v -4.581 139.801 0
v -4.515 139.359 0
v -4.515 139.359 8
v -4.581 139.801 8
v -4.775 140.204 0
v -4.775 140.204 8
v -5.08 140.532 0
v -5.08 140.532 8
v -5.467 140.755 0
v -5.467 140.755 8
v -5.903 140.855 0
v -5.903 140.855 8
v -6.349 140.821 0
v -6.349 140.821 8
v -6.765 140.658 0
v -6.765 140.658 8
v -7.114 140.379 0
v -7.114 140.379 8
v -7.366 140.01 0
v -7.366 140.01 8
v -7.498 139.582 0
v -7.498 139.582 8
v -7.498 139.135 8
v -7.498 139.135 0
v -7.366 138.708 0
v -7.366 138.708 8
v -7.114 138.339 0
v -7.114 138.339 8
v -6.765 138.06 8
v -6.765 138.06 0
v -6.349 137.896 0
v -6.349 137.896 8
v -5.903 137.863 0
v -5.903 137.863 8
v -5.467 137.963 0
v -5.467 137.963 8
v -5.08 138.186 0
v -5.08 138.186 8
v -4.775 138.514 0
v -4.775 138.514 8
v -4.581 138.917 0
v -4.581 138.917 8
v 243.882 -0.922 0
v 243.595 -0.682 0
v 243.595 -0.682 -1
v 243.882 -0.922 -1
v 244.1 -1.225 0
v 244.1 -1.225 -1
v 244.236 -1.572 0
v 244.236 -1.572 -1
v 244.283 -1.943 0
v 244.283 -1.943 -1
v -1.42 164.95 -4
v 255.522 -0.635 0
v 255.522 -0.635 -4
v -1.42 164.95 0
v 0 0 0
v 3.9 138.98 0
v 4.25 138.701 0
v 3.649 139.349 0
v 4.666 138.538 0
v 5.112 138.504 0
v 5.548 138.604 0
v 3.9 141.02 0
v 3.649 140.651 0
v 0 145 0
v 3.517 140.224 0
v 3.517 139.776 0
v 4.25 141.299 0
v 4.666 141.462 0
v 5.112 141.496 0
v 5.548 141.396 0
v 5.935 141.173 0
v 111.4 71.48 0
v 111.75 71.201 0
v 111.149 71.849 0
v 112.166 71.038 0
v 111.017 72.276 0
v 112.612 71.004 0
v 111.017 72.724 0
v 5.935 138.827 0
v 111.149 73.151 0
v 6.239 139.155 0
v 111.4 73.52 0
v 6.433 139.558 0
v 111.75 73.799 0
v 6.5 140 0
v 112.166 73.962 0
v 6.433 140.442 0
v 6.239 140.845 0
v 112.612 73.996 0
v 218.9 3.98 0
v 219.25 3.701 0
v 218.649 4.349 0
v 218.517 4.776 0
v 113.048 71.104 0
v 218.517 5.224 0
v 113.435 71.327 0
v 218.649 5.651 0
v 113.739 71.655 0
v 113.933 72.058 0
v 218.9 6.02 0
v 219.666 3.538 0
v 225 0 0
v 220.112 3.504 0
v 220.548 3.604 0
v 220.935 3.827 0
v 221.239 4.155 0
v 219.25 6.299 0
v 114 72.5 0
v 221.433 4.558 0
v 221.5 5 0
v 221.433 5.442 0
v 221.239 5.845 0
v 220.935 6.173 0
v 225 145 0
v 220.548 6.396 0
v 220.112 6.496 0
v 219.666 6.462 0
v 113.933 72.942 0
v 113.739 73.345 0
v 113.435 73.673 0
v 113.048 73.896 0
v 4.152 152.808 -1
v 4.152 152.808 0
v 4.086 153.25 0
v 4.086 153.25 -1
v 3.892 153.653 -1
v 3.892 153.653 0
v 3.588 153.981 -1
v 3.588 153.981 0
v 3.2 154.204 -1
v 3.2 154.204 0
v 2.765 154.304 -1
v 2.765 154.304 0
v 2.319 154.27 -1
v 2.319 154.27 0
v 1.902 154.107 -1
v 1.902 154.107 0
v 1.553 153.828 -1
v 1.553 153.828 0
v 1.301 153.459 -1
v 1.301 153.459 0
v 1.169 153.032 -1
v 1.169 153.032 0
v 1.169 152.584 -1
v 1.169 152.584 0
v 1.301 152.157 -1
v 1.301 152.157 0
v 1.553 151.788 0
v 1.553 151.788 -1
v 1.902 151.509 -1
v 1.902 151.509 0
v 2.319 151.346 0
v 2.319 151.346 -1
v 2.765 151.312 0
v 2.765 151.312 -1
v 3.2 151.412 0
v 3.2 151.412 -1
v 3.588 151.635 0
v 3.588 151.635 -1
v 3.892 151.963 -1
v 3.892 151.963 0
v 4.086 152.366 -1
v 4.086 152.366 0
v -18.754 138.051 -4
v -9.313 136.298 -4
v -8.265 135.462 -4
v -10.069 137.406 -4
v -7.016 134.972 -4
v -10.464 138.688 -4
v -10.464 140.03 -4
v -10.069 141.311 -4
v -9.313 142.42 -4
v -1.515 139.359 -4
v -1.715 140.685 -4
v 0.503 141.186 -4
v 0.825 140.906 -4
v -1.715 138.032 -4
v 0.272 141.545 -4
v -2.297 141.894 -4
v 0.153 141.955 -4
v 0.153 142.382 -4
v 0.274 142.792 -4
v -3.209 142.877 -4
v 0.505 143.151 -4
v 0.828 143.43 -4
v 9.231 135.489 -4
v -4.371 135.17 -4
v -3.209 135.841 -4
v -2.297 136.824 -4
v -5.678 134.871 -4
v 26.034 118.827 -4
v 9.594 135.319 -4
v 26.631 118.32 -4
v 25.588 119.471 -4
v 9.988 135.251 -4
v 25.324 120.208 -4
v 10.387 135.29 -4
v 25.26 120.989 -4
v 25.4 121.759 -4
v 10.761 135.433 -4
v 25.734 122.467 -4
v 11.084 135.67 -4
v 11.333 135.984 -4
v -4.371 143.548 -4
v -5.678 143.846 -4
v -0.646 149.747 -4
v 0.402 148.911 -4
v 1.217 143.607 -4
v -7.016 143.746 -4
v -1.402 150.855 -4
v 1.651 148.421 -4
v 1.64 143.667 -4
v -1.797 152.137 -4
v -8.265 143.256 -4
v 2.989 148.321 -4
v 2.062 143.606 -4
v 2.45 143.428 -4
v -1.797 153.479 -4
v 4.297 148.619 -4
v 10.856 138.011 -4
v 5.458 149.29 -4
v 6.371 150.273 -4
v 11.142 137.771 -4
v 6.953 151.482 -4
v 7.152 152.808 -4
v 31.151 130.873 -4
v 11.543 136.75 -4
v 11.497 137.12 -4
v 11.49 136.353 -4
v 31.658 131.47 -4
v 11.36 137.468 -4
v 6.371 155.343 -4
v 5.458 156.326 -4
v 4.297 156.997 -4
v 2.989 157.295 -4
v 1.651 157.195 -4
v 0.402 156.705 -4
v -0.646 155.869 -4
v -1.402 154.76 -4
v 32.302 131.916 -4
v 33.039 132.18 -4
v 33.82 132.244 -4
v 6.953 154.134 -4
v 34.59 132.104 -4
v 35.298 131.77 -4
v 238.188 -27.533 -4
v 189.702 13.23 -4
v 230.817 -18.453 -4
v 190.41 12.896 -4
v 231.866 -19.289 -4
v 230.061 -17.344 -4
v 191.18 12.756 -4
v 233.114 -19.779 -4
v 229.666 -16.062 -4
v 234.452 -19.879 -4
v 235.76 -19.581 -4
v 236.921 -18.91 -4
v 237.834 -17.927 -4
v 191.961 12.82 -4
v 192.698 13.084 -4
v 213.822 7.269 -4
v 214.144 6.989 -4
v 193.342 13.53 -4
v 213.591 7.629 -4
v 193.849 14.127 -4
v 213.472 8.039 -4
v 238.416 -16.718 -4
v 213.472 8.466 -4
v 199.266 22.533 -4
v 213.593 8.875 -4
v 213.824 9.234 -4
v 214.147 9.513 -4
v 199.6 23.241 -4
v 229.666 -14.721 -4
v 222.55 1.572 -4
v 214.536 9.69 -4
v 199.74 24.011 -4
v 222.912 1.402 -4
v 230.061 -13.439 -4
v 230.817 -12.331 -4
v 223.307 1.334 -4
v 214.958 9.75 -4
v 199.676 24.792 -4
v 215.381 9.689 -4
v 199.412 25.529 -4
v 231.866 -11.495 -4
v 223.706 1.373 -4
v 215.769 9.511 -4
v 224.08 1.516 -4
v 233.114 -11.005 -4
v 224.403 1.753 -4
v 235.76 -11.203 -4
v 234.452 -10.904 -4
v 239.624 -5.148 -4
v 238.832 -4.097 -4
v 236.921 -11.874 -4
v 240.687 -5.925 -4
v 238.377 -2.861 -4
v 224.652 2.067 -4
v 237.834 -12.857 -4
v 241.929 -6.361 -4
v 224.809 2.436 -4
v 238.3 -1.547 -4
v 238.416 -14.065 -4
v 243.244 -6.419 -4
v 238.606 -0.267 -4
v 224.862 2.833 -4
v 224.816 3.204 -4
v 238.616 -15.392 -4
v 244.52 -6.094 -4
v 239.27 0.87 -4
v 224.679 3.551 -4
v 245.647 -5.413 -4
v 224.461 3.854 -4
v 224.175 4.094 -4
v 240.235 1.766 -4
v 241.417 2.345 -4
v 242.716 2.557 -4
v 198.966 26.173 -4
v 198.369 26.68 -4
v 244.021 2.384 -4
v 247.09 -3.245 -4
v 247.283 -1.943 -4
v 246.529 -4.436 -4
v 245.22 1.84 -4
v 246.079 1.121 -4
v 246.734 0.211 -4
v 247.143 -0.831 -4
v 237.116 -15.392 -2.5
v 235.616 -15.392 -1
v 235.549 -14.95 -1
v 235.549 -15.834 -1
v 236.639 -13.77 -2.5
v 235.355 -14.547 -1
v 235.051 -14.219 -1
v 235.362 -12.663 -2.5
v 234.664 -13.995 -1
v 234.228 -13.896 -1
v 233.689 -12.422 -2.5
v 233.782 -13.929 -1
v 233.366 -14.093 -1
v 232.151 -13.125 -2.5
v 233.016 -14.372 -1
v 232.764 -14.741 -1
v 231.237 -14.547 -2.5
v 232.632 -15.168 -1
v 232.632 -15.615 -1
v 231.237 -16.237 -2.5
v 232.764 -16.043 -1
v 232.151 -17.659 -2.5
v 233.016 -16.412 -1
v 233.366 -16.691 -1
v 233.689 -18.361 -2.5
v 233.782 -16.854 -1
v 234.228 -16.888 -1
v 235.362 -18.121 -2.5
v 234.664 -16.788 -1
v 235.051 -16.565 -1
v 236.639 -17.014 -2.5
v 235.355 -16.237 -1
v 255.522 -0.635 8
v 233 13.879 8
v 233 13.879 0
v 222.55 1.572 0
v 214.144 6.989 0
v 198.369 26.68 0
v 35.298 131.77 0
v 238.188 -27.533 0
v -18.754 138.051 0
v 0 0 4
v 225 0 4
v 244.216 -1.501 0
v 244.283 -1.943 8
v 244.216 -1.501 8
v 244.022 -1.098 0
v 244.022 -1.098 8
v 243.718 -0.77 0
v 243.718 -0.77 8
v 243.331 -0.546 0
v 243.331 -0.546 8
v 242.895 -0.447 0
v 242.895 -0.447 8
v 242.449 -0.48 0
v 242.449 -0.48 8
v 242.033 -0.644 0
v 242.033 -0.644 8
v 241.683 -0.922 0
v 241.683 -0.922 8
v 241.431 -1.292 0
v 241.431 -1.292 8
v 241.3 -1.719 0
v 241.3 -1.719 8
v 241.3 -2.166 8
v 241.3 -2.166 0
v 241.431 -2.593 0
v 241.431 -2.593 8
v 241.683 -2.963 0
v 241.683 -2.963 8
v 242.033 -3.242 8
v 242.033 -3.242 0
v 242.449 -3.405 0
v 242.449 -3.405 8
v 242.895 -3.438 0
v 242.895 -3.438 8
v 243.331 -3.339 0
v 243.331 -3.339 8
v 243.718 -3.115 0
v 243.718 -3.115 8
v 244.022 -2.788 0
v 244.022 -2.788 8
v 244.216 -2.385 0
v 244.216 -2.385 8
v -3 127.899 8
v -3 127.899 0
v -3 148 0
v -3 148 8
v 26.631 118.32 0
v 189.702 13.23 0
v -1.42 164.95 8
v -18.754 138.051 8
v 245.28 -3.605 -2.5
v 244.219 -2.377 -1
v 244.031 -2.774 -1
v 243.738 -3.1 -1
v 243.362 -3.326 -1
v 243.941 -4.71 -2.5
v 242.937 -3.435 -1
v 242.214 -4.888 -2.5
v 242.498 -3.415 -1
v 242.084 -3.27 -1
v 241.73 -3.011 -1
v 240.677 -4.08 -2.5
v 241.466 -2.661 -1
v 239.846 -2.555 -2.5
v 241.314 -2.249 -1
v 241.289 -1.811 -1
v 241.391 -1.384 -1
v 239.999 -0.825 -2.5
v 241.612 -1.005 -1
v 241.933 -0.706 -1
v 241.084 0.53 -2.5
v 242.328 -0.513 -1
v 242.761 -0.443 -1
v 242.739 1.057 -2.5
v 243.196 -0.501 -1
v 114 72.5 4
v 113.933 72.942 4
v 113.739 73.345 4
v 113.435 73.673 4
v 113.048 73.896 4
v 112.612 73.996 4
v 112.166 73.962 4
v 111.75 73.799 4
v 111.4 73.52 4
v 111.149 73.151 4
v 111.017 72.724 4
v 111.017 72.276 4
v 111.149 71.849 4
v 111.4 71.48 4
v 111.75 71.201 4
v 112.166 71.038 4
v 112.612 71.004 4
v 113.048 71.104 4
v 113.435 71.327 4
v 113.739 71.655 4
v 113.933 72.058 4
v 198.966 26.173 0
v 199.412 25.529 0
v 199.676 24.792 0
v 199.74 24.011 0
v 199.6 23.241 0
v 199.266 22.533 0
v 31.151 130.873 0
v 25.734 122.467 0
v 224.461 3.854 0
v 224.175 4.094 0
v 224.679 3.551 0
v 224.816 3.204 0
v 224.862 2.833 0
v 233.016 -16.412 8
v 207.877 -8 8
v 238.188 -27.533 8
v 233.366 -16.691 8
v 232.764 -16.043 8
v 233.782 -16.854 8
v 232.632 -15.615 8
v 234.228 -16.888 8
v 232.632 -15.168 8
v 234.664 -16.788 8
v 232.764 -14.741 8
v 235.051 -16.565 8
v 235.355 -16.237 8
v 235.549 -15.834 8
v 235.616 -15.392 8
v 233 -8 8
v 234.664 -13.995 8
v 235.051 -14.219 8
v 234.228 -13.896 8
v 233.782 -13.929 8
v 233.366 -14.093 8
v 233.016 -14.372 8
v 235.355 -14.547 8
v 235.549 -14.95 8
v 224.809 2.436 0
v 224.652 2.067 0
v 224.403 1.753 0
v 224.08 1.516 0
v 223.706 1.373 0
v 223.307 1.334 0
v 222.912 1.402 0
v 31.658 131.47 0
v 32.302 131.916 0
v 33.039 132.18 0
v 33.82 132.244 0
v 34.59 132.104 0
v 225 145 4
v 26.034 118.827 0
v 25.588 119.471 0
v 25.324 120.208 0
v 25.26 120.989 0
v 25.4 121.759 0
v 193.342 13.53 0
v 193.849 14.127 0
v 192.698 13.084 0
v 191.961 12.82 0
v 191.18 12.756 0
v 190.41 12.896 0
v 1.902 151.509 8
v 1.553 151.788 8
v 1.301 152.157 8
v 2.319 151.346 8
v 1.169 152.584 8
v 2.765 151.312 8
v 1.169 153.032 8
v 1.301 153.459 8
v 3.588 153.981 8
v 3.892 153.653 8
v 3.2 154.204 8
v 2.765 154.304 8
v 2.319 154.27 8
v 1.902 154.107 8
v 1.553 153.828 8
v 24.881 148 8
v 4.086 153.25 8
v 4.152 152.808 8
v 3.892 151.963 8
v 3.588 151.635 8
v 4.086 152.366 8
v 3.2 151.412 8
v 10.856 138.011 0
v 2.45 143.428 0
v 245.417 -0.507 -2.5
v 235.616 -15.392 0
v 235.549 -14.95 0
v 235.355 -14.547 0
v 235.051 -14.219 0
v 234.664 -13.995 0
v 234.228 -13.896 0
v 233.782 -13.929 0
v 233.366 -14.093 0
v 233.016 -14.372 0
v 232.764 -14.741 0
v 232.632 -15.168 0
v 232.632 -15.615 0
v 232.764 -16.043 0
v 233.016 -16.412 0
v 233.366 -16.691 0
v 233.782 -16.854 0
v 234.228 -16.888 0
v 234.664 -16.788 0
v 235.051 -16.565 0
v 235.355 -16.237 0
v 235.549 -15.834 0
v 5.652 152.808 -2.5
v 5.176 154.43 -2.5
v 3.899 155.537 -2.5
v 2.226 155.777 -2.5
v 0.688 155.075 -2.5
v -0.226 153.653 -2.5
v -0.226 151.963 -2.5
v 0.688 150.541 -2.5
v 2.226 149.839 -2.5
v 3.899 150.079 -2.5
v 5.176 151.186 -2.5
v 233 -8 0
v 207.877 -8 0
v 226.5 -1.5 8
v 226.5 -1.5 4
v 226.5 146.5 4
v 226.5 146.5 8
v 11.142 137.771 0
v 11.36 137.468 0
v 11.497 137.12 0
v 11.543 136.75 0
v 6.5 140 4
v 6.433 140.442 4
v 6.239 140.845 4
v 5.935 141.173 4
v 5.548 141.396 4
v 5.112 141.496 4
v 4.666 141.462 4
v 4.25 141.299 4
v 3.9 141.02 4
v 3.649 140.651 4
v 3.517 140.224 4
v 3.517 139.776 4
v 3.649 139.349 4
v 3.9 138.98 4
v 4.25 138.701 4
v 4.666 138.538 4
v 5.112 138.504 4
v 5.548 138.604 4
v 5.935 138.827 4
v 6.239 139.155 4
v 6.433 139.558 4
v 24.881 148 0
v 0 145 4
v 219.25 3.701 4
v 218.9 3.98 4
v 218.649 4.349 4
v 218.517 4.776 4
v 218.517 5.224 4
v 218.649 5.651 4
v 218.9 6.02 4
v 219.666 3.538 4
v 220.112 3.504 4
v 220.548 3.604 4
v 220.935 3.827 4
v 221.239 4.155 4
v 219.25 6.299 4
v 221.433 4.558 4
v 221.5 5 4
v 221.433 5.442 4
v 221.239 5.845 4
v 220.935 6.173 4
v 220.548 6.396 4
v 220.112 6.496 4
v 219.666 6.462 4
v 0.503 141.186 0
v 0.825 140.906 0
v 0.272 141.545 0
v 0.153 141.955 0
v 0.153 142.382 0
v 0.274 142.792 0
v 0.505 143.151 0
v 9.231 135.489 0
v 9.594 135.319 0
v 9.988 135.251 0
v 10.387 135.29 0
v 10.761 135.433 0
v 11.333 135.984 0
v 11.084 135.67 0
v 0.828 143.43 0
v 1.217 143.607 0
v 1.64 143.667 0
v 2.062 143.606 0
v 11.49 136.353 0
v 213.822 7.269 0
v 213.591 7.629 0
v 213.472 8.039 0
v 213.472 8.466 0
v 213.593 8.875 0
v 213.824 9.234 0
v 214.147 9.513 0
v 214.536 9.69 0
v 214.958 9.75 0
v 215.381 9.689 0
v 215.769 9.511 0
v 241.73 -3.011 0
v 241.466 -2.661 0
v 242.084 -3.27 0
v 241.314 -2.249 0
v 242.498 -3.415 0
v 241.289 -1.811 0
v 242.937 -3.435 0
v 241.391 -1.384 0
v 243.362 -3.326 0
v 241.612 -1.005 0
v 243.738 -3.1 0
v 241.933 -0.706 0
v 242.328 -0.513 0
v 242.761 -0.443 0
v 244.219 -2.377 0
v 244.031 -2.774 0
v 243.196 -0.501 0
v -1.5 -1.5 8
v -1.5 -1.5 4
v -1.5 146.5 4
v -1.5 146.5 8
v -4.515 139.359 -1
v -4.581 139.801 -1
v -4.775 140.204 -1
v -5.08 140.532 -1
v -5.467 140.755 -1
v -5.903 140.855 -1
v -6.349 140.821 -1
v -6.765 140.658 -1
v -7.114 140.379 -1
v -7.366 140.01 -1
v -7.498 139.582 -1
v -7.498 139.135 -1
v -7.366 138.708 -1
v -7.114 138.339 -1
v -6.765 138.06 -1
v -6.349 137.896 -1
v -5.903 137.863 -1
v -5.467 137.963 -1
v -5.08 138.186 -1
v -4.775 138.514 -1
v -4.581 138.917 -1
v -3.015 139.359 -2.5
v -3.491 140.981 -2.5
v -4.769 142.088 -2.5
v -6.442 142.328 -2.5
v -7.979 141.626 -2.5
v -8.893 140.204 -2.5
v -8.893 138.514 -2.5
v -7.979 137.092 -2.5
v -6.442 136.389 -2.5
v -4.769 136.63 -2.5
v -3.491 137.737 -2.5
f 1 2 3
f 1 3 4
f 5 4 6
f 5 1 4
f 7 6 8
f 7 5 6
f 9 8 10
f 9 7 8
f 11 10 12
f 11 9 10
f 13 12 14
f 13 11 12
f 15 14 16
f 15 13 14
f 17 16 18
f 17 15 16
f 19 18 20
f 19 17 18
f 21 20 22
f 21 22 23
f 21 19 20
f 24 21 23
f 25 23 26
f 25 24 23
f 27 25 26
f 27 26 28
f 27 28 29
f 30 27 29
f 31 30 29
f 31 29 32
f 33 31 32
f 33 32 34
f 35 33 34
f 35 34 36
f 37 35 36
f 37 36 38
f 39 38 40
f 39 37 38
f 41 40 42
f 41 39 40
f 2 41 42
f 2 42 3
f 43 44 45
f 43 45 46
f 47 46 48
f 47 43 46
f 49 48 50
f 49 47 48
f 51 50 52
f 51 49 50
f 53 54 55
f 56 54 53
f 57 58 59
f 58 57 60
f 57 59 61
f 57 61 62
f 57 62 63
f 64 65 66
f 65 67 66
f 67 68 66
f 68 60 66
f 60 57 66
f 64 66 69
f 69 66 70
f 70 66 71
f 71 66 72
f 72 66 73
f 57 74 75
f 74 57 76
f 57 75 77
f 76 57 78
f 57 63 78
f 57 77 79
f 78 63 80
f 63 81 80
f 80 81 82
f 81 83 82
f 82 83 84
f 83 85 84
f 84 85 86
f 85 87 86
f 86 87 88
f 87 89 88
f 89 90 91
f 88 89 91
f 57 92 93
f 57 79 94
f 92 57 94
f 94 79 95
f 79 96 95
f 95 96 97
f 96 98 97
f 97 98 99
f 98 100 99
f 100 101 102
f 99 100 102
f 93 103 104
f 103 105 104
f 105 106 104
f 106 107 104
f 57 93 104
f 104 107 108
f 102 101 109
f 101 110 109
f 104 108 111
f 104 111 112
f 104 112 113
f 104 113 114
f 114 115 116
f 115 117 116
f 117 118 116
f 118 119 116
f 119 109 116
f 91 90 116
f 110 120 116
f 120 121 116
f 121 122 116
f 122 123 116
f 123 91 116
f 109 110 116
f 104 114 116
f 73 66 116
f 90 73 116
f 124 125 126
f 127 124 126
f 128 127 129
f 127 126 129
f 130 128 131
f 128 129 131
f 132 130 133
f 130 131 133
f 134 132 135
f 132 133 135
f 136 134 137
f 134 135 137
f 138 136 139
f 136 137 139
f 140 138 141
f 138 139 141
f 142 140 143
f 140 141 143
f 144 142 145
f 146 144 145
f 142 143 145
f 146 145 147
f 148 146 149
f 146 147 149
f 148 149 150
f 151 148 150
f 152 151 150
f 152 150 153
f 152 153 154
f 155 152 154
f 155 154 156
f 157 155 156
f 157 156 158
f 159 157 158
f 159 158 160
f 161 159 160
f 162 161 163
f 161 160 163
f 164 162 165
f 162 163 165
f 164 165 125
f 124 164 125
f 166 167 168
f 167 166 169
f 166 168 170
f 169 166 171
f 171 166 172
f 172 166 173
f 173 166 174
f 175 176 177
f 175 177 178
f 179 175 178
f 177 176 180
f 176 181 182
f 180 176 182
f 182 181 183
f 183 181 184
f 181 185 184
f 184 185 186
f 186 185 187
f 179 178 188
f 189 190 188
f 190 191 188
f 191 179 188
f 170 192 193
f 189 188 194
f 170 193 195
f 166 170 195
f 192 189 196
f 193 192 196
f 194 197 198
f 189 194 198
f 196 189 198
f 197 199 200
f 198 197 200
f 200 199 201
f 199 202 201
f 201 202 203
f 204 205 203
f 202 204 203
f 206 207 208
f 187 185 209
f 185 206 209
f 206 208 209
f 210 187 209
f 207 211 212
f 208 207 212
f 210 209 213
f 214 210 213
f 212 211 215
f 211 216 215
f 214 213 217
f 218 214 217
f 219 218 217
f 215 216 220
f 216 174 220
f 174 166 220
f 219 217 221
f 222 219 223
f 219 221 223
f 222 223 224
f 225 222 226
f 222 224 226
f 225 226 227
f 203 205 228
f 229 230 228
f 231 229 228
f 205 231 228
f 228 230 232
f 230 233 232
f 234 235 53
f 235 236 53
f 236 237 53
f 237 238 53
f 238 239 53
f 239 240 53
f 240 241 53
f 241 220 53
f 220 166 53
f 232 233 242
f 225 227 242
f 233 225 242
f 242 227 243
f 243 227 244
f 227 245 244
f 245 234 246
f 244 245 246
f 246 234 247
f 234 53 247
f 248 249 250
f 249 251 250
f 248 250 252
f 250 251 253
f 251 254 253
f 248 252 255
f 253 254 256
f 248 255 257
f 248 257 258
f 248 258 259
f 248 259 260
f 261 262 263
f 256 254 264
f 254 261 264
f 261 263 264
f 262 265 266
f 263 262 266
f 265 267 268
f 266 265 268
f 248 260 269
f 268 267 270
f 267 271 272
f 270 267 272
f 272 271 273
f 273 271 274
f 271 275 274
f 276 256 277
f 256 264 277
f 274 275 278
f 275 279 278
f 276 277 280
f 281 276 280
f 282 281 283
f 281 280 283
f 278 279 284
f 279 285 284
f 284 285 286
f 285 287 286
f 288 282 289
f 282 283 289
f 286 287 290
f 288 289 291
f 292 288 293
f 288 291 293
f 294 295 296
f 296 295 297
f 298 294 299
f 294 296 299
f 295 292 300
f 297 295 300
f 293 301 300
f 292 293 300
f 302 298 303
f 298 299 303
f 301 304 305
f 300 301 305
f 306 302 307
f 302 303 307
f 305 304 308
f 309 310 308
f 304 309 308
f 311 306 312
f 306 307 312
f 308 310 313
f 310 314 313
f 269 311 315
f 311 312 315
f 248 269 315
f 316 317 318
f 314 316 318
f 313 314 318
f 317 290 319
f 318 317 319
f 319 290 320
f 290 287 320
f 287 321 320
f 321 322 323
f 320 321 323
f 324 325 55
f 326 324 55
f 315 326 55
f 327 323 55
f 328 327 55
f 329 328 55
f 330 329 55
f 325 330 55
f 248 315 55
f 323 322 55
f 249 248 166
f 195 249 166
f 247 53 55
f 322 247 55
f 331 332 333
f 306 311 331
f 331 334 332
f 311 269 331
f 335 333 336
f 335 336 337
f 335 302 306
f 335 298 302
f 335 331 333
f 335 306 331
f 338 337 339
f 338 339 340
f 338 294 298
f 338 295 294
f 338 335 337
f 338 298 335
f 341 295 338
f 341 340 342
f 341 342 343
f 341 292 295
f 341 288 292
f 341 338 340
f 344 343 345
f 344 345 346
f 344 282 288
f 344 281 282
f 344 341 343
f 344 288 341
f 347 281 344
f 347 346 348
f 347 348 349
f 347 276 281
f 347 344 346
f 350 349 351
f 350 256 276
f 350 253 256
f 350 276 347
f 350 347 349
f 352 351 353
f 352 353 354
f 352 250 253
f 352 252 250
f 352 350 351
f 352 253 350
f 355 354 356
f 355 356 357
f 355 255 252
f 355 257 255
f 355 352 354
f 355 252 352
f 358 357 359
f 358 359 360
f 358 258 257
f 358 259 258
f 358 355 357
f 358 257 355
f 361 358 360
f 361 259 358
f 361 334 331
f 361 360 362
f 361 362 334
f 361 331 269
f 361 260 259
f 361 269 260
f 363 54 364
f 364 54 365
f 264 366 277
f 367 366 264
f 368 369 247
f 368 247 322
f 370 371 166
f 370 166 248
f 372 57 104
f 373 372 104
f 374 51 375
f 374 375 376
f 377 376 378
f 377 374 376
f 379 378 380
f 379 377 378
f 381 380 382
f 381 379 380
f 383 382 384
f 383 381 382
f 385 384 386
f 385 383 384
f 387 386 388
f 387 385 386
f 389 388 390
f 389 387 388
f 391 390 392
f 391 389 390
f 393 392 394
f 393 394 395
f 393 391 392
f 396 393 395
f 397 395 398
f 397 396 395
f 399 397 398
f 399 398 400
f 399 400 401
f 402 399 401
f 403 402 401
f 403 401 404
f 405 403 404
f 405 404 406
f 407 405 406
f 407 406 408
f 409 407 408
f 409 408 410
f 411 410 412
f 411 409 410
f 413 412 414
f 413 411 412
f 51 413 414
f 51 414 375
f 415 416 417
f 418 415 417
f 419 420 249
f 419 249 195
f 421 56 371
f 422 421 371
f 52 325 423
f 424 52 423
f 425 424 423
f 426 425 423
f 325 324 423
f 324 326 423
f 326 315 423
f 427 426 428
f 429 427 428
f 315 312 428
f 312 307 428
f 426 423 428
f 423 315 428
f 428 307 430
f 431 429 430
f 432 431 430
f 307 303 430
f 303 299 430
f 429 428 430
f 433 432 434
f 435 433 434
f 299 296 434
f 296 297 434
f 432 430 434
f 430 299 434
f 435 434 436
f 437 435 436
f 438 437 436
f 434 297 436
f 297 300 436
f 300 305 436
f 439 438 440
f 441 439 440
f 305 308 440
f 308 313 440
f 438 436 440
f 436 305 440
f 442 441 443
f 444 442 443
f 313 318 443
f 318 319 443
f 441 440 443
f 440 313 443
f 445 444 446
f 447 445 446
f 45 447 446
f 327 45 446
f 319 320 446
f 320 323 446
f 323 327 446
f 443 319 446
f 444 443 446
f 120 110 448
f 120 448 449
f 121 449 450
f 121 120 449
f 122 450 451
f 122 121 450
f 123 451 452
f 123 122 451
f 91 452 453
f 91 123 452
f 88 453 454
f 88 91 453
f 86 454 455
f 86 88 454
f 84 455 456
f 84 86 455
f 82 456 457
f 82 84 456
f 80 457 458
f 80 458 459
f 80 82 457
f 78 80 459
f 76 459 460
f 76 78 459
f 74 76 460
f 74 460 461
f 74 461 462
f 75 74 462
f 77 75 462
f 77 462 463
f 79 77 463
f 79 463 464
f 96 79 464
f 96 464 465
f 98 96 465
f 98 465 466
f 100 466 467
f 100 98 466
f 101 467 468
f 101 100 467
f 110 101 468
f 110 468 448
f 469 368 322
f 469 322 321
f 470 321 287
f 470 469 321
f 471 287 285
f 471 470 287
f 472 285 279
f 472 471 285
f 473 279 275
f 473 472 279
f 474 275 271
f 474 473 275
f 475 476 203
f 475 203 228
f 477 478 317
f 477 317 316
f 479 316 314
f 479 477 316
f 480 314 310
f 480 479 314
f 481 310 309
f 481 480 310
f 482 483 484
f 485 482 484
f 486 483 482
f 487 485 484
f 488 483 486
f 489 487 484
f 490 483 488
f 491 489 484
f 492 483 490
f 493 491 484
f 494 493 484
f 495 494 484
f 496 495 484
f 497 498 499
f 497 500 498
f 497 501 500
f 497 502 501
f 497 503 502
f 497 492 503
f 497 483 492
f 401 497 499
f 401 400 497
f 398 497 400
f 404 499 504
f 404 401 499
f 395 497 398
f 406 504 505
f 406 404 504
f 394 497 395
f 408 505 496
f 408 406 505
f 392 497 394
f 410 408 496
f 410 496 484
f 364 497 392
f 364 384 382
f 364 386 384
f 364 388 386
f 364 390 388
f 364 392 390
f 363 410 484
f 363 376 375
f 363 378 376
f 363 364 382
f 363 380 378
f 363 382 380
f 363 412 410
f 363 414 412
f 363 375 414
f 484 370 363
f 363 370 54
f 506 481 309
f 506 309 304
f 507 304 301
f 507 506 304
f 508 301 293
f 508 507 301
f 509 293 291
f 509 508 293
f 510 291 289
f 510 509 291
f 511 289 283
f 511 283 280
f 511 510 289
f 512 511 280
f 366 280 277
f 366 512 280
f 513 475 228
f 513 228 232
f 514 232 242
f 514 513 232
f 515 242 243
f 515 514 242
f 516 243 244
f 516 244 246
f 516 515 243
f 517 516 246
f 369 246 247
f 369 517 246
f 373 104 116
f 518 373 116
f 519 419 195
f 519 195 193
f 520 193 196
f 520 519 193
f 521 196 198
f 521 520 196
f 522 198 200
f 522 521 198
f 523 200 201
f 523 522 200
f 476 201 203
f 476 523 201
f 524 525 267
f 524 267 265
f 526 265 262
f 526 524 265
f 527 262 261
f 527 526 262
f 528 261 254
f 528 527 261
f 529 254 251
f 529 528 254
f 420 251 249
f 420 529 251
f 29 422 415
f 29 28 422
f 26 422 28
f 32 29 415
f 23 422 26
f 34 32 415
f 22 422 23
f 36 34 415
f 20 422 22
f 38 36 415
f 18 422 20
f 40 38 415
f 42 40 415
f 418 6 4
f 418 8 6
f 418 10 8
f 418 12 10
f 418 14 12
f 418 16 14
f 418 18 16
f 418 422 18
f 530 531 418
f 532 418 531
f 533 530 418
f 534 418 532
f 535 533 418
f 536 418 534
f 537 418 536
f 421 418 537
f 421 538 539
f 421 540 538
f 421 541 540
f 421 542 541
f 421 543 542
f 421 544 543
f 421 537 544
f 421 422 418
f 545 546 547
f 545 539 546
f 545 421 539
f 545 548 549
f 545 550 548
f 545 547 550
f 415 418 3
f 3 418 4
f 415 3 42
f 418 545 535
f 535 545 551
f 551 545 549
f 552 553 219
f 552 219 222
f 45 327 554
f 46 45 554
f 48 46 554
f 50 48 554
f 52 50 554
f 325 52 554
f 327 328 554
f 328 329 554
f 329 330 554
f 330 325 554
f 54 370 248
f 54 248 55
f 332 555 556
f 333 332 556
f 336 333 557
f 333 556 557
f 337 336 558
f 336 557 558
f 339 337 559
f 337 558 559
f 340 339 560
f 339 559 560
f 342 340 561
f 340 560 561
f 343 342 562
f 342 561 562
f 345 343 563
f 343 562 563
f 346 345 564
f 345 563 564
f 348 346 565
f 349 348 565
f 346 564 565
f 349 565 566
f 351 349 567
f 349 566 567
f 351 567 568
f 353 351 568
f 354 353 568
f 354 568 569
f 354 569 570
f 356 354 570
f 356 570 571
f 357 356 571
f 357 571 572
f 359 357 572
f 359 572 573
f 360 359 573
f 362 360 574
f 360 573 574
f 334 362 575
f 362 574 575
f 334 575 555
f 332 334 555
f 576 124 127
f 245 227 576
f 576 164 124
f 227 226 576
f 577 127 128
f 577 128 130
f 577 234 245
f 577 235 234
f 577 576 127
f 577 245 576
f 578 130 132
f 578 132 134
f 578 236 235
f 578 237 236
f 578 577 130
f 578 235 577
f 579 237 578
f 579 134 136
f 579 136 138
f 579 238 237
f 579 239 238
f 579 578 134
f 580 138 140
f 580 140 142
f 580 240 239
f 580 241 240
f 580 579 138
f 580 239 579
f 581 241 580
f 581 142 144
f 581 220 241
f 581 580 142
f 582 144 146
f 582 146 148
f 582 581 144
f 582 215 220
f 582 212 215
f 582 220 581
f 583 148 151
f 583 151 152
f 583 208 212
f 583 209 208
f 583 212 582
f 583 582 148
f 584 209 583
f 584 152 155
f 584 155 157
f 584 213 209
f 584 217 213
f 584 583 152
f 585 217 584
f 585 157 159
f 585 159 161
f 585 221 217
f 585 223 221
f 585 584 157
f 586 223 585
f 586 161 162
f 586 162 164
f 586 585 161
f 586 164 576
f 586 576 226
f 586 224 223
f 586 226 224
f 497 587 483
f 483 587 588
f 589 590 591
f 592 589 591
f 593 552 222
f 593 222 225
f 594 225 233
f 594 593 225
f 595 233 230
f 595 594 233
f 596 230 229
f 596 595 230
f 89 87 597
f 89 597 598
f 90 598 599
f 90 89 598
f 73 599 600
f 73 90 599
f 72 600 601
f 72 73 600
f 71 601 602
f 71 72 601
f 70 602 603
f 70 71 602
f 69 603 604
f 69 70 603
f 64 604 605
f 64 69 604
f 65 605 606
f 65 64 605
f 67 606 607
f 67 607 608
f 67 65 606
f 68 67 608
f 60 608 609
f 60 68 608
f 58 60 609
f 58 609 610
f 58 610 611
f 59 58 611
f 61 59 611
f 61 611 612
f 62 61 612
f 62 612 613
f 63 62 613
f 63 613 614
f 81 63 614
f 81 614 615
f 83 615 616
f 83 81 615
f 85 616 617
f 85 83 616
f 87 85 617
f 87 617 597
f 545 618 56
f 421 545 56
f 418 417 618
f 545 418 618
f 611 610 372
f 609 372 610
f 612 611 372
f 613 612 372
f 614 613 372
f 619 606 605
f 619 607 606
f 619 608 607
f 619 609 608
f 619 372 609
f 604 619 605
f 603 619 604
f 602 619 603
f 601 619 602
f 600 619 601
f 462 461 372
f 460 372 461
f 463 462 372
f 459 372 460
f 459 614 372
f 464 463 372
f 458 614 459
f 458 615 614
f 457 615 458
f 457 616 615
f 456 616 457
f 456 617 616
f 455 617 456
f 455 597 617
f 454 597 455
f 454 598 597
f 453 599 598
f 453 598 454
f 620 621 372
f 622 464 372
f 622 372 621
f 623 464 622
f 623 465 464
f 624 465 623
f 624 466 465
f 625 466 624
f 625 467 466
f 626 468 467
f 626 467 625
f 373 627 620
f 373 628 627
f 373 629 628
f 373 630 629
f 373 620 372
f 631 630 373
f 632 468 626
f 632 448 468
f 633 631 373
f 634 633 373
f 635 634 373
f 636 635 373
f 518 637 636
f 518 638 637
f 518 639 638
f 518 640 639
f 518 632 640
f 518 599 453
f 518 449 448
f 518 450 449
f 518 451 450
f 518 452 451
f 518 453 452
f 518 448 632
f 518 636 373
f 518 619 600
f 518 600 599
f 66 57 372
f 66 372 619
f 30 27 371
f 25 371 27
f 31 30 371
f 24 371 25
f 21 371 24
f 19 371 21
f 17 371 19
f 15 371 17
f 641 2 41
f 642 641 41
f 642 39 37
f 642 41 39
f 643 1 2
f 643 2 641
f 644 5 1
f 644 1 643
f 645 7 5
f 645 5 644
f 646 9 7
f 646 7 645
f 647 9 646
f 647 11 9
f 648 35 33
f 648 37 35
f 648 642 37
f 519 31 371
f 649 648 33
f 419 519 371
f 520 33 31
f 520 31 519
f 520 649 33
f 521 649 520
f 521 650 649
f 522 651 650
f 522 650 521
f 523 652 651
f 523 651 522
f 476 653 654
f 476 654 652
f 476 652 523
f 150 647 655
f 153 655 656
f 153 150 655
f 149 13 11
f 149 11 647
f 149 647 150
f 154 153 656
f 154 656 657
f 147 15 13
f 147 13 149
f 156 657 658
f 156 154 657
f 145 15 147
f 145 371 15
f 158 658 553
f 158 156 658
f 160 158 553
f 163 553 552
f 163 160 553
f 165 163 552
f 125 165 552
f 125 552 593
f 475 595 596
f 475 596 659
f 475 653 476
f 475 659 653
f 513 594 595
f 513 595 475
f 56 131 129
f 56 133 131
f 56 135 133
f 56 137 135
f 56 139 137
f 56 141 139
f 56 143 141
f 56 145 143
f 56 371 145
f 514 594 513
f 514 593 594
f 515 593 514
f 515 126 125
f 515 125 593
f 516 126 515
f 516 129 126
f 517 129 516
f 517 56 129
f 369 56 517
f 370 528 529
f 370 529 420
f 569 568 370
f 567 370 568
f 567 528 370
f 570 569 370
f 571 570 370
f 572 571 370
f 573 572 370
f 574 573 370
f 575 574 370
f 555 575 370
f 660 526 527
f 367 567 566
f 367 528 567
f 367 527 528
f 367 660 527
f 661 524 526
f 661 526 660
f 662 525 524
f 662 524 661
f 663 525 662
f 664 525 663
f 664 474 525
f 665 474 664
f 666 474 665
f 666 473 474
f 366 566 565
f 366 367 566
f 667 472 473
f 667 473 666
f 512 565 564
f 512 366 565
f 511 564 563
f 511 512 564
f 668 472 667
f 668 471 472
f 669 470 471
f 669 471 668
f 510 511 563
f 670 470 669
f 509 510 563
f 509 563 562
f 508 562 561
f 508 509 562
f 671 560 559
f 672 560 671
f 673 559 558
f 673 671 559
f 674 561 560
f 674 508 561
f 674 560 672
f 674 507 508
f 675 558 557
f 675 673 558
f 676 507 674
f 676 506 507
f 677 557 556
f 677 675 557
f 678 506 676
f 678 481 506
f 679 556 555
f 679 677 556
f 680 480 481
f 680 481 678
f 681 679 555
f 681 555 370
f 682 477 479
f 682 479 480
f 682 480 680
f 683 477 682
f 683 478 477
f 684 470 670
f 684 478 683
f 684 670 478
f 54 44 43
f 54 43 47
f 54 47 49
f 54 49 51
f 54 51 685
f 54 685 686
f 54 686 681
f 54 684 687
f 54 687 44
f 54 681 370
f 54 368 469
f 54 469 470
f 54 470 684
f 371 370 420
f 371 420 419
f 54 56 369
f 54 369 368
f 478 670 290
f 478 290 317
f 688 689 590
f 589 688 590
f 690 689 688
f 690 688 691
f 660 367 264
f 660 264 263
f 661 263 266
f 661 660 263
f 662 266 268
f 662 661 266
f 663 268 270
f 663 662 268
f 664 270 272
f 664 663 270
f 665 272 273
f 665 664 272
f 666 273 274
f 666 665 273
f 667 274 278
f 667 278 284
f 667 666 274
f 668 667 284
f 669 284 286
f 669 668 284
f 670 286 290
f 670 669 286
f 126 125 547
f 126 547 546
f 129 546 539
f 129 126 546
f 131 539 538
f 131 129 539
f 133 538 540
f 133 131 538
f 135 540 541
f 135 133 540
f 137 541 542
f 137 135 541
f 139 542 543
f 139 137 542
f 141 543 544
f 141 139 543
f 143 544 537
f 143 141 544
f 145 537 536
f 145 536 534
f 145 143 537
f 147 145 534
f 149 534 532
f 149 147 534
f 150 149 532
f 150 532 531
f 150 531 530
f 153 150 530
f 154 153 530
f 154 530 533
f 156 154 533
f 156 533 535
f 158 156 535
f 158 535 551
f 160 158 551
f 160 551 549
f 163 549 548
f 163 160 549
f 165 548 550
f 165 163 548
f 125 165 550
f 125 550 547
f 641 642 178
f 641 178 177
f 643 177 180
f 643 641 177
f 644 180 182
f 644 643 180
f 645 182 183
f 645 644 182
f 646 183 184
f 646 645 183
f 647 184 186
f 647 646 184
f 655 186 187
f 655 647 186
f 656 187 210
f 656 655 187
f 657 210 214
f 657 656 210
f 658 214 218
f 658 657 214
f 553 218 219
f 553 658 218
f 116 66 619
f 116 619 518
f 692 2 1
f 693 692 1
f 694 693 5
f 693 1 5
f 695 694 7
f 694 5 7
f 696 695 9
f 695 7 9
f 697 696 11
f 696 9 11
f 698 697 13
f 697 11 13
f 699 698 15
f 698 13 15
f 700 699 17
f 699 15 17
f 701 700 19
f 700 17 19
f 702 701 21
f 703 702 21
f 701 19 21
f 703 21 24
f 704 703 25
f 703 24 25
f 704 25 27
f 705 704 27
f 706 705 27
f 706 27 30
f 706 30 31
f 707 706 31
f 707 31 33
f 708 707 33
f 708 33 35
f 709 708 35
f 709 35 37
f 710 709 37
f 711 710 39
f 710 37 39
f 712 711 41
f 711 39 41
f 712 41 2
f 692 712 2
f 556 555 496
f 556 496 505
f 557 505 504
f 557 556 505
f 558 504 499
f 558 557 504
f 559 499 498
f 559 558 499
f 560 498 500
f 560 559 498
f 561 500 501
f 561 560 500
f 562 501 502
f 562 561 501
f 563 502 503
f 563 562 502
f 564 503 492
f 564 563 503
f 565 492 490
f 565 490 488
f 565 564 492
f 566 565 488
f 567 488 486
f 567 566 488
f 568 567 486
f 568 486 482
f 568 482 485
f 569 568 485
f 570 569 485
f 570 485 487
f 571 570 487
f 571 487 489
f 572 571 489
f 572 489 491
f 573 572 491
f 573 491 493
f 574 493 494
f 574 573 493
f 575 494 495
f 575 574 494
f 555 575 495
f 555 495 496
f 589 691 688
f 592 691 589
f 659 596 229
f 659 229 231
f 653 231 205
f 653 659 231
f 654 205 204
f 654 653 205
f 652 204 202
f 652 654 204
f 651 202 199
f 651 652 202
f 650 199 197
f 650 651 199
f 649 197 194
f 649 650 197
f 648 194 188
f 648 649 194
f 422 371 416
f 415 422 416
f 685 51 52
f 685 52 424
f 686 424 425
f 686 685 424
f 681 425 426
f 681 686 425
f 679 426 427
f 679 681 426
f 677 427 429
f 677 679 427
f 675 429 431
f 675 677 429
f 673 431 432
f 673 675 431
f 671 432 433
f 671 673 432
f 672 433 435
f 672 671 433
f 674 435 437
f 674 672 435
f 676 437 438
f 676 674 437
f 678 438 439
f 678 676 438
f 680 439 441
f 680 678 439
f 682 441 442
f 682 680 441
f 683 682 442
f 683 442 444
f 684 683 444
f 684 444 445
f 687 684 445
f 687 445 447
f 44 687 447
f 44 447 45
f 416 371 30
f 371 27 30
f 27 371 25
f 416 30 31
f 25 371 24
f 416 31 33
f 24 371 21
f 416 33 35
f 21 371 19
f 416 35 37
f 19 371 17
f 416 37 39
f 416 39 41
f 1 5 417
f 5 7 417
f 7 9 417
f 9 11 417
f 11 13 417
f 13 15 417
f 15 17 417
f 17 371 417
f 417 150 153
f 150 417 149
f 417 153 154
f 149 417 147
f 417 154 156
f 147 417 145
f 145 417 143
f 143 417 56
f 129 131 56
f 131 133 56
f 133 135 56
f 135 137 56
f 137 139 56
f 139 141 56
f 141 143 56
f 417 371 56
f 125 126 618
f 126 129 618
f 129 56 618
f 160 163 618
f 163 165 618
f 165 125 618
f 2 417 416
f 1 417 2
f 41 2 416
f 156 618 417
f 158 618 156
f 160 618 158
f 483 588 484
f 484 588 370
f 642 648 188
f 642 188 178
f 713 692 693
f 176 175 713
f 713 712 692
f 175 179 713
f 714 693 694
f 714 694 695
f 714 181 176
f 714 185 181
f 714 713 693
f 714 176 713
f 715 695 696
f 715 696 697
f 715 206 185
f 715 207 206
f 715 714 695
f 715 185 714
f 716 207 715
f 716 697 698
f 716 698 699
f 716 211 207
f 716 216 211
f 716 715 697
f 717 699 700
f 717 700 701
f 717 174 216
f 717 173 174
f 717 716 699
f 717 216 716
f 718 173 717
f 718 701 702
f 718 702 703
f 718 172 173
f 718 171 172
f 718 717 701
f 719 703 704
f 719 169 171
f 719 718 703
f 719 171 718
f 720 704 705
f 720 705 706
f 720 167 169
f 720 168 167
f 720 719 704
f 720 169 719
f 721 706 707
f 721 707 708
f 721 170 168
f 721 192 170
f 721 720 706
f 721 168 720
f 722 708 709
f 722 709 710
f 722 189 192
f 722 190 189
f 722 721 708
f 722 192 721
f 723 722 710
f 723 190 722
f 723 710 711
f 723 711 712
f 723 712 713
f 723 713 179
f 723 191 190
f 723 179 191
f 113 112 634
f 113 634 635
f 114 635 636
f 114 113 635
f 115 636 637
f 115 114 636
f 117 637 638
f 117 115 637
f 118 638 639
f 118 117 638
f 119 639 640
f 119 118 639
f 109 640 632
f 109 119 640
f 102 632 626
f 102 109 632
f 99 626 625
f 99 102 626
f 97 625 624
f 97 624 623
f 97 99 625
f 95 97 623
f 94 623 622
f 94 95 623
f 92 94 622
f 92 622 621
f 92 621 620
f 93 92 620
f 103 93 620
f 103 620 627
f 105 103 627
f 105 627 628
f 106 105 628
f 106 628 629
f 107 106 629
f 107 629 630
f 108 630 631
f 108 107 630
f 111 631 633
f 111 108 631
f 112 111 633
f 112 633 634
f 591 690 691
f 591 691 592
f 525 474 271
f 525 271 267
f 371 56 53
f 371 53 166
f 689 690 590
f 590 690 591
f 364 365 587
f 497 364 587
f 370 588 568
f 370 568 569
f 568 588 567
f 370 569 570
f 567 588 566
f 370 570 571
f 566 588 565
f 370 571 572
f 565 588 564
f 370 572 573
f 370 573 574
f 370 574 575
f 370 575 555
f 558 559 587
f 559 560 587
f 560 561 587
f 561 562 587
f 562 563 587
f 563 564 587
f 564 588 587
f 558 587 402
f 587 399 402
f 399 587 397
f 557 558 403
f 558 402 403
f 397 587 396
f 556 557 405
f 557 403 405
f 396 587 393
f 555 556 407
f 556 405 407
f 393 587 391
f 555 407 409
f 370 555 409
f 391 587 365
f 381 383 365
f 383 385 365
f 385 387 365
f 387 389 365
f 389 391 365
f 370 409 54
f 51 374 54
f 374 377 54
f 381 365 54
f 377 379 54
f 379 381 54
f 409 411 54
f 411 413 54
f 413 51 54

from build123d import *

# Parameters (mm, degrees)
F1_W     = 225
F1_H     = 145
F1_R     = 1.5
F2_DEPTH = 4
F3_R     = 1.5
F4_DEPTH = 4
F5_R     = 1.5
F6_DEPTH = 8
F7_DEPTH = 8
F8_START = 4
F1_W_2   = 228
F1_H_2   = 148
F8_DEPTH = 4
F9_SIZE  = 3


with BuildPart() as f2:
    # F1 (on Top) → F2 (new body)
    with BuildSketch(Plane.XY):
        with Locations((112.5, 72.5)):
            Rectangle(F1_W, F1_H)
        with Locations((220, 5)):
            Circle(F1_R, mode=Mode.SUBTRACT)
        with Locations((5, 140)):
            Circle(F1_R, mode=Mode.SUBTRACT)
        with Locations((112.5, 72.5)):
            Circle(F1_R, mode=Mode.SUBTRACT)
    extrude(amount=F2_DEPTH)


with BuildPart() as f4:
    # F3 (on Top) → F4 (new body)
    with BuildSketch(Plane.XY):
        Polygon((-1.4196310815, 164.9495525662), (-18.7540737608, 138.0512794432), (238.1876255728, -27.5333712384), (255.5220682521, -0.6350981154), (247.1163579011, 4.7819152219), align=None)
        with Locations((234.1155258917, -15.3917896204)):
            Circle(F3_R, mode=Mode.SUBTRACT)
        with BuildLine():
            ThreePointArc((214.1440217888, 6.9893514497), (213.6957172368, 9.062760003), (215.76912579, 9.511064555))
            Line((215.76912579, 9.511064555), (224.174836141, 4.0940512177))
            ThreePointArc((224.174836141, 4.0940512177), (224.6792556664, 3.551237839), (224.8622841404, 2.8331946651))
            ThreePointArc((224.8622841404, 2.8331946651), (224.0803273143, 1.516223139), (222.5497321398, 1.5723381125))
            Line((222.5497321398, 1.5723381125), (214.1440217888, 6.9893514497))
        make_face(mode=Mode.SUBTRACT)
        with BuildLine():
            ThreePointArc((244.2827472313, -1.9426530589), (241.4657757053, -2.6606962328), (243.5952992319, -0.6817965062))
            ThreePointArc((243.5952992319, -0.6817965062), (244.0997187574, -1.224609885), (244.2827472313, -1.9426530589))
        make_face(mode=Mode.SUBTRACT)
        with BuildLine():
            ThreePointArc((31.1514031593, 130.8729885482), (33.039117887, 132.1801270433), (35.2982202657, 131.7695976523))
            Line((35.2982202657, 131.7695976523), (198.3690010739, 26.6795389092))
            ThreePointArc((198.3690010739, 26.6795389092), (199.676139569, 24.7918241815), (199.265610178, 22.5327218028))
            Line((199.265610178, 22.5327218028), (193.8485968407, 14.1270114518))
            ThreePointArc((193.8485968407, 14.1270114518), (191.960882113, 12.8198729567), (189.7017797343, 13.2304023477))
            Line((189.7017797343, 13.2304023477), (26.6309989261, 118.3204610908))
            ThreePointArc((26.6309989261, 118.3204610908), (25.323860431, 120.2081758185), (25.734389822, 122.4672781972))
            Line((25.734389822, 122.4672781972), (31.1514031593, 130.8729885482))
        make_face(mode=Mode.SUBTRACT)
        with Locations((-6.01475274, 139.3588343867)):
            Circle(F3_R, mode=Mode.SUBTRACT)
        with BuildLine():
            ThreePointArc((0.825163859, 140.9059487823), (0.376859307, 142.9793573355), (2.4502678602, 143.4276618875))
            Line((2.4502678602, 143.4276618875), (10.8559782112, 138.0106485503))
            ThreePointArc((10.8559782112, 138.0106485503), (11.3603977366, 137.4678351715), (11.5434262106, 136.7497919976))
            ThreePointArc((11.5434262106, 136.7497919976), (10.7614693844, 135.4328204716), (9.23087421, 135.488935445))
            Line((9.23087421, 135.488935445), (0.825163859, 140.9059487823))
        make_face(mode=Mode.SUBTRACT)
        with Locations((2.6524685996, 152.8079709482)):
            Circle(F3_R, mode=Mode.SUBTRACT)
    extrude(amount=-F4_DEPTH)

    # F9
    f9_edges = [f4.edges().sort_by_distance(p)[0] for p in [
        (232.615526, -15.39179, -4),
        (241.970195, -3.20351, -4),
        (1.152469, 152.807971, -4),
        (-7.514753, 139.358834, -4),
    ]]
    chamfer(f9_edges, length=F9_SIZE)


with BuildPart() as f6:
    # F5 (on face) → F6 (new body)
    with BuildSketch(Plane.XY):
        Polygon((24.8813987626, 148), (-1.4196310815, 164.9495525662), (-18.7540737608, 138.0512794432), (-3, 127.8986541307), (-3, 148), align=None)
        with Locations((-6.01475274, 139.3588343867)):
            Circle(F5_R, mode=Mode.SUBTRACT)
        with Locations((2.6524685996, 152.8079709482)):
            Circle(F5_R, mode=Mode.SUBTRACT)
    extrude(amount=F6_DEPTH)


with BuildPart() as f7:
    # F5 (on face) → F7 (new body)
    with BuildSketch(Plane.XY):
        Polygon((255.5220682521, -0.6350981154), (233, 13.879123647), (233, -8), (207.877221927, -8), (238.1876255728, -27.5333712384), align=None)
        with Locations((234.1155258917, -15.3917896204)):
            Circle(F5_R, mode=Mode.SUBTRACT)
        with Locations((242.7827472313, -1.9426530589)):
            Circle(F5_R, mode=Mode.SUBTRACT)
    extrude(amount=F7_DEPTH)


with BuildPart() as f8:
    # F1 (on Top) → F8 (new body)
    with BuildSketch(Plane.XY.offset(F8_START)):
        with Locations((112.5, 72.5)):
            Rectangle(F1_W_2, F1_H_2)
        with Locations((112.5, 72.5)):
            Rectangle(F1_W, F1_H, mode=Mode.SUBTRACT)
        with Locations((112.5, 72.5)):
            Rectangle(F1_W, F1_H)
        with Locations((220, 5)):
            Circle(F1_R, mode=Mode.SUBTRACT)
        with Locations((5, 140)):
            Circle(F1_R, mode=Mode.SUBTRACT)
        with Locations((112.5, 72.5)):
            Circle(F1_R, mode=Mode.SUBTRACT)
        with Locations((5, 140)):
            Circle(F1_R)
        with Locations((220, 5)):
            Circle(F1_R)
        with Locations((112.5, 72.5)):
            Circle(F1_R)
    extrude(amount=F8_DEPTH)


solid = Compound([f2.part, f4.part, f6.part, f7.part, f8.part])
